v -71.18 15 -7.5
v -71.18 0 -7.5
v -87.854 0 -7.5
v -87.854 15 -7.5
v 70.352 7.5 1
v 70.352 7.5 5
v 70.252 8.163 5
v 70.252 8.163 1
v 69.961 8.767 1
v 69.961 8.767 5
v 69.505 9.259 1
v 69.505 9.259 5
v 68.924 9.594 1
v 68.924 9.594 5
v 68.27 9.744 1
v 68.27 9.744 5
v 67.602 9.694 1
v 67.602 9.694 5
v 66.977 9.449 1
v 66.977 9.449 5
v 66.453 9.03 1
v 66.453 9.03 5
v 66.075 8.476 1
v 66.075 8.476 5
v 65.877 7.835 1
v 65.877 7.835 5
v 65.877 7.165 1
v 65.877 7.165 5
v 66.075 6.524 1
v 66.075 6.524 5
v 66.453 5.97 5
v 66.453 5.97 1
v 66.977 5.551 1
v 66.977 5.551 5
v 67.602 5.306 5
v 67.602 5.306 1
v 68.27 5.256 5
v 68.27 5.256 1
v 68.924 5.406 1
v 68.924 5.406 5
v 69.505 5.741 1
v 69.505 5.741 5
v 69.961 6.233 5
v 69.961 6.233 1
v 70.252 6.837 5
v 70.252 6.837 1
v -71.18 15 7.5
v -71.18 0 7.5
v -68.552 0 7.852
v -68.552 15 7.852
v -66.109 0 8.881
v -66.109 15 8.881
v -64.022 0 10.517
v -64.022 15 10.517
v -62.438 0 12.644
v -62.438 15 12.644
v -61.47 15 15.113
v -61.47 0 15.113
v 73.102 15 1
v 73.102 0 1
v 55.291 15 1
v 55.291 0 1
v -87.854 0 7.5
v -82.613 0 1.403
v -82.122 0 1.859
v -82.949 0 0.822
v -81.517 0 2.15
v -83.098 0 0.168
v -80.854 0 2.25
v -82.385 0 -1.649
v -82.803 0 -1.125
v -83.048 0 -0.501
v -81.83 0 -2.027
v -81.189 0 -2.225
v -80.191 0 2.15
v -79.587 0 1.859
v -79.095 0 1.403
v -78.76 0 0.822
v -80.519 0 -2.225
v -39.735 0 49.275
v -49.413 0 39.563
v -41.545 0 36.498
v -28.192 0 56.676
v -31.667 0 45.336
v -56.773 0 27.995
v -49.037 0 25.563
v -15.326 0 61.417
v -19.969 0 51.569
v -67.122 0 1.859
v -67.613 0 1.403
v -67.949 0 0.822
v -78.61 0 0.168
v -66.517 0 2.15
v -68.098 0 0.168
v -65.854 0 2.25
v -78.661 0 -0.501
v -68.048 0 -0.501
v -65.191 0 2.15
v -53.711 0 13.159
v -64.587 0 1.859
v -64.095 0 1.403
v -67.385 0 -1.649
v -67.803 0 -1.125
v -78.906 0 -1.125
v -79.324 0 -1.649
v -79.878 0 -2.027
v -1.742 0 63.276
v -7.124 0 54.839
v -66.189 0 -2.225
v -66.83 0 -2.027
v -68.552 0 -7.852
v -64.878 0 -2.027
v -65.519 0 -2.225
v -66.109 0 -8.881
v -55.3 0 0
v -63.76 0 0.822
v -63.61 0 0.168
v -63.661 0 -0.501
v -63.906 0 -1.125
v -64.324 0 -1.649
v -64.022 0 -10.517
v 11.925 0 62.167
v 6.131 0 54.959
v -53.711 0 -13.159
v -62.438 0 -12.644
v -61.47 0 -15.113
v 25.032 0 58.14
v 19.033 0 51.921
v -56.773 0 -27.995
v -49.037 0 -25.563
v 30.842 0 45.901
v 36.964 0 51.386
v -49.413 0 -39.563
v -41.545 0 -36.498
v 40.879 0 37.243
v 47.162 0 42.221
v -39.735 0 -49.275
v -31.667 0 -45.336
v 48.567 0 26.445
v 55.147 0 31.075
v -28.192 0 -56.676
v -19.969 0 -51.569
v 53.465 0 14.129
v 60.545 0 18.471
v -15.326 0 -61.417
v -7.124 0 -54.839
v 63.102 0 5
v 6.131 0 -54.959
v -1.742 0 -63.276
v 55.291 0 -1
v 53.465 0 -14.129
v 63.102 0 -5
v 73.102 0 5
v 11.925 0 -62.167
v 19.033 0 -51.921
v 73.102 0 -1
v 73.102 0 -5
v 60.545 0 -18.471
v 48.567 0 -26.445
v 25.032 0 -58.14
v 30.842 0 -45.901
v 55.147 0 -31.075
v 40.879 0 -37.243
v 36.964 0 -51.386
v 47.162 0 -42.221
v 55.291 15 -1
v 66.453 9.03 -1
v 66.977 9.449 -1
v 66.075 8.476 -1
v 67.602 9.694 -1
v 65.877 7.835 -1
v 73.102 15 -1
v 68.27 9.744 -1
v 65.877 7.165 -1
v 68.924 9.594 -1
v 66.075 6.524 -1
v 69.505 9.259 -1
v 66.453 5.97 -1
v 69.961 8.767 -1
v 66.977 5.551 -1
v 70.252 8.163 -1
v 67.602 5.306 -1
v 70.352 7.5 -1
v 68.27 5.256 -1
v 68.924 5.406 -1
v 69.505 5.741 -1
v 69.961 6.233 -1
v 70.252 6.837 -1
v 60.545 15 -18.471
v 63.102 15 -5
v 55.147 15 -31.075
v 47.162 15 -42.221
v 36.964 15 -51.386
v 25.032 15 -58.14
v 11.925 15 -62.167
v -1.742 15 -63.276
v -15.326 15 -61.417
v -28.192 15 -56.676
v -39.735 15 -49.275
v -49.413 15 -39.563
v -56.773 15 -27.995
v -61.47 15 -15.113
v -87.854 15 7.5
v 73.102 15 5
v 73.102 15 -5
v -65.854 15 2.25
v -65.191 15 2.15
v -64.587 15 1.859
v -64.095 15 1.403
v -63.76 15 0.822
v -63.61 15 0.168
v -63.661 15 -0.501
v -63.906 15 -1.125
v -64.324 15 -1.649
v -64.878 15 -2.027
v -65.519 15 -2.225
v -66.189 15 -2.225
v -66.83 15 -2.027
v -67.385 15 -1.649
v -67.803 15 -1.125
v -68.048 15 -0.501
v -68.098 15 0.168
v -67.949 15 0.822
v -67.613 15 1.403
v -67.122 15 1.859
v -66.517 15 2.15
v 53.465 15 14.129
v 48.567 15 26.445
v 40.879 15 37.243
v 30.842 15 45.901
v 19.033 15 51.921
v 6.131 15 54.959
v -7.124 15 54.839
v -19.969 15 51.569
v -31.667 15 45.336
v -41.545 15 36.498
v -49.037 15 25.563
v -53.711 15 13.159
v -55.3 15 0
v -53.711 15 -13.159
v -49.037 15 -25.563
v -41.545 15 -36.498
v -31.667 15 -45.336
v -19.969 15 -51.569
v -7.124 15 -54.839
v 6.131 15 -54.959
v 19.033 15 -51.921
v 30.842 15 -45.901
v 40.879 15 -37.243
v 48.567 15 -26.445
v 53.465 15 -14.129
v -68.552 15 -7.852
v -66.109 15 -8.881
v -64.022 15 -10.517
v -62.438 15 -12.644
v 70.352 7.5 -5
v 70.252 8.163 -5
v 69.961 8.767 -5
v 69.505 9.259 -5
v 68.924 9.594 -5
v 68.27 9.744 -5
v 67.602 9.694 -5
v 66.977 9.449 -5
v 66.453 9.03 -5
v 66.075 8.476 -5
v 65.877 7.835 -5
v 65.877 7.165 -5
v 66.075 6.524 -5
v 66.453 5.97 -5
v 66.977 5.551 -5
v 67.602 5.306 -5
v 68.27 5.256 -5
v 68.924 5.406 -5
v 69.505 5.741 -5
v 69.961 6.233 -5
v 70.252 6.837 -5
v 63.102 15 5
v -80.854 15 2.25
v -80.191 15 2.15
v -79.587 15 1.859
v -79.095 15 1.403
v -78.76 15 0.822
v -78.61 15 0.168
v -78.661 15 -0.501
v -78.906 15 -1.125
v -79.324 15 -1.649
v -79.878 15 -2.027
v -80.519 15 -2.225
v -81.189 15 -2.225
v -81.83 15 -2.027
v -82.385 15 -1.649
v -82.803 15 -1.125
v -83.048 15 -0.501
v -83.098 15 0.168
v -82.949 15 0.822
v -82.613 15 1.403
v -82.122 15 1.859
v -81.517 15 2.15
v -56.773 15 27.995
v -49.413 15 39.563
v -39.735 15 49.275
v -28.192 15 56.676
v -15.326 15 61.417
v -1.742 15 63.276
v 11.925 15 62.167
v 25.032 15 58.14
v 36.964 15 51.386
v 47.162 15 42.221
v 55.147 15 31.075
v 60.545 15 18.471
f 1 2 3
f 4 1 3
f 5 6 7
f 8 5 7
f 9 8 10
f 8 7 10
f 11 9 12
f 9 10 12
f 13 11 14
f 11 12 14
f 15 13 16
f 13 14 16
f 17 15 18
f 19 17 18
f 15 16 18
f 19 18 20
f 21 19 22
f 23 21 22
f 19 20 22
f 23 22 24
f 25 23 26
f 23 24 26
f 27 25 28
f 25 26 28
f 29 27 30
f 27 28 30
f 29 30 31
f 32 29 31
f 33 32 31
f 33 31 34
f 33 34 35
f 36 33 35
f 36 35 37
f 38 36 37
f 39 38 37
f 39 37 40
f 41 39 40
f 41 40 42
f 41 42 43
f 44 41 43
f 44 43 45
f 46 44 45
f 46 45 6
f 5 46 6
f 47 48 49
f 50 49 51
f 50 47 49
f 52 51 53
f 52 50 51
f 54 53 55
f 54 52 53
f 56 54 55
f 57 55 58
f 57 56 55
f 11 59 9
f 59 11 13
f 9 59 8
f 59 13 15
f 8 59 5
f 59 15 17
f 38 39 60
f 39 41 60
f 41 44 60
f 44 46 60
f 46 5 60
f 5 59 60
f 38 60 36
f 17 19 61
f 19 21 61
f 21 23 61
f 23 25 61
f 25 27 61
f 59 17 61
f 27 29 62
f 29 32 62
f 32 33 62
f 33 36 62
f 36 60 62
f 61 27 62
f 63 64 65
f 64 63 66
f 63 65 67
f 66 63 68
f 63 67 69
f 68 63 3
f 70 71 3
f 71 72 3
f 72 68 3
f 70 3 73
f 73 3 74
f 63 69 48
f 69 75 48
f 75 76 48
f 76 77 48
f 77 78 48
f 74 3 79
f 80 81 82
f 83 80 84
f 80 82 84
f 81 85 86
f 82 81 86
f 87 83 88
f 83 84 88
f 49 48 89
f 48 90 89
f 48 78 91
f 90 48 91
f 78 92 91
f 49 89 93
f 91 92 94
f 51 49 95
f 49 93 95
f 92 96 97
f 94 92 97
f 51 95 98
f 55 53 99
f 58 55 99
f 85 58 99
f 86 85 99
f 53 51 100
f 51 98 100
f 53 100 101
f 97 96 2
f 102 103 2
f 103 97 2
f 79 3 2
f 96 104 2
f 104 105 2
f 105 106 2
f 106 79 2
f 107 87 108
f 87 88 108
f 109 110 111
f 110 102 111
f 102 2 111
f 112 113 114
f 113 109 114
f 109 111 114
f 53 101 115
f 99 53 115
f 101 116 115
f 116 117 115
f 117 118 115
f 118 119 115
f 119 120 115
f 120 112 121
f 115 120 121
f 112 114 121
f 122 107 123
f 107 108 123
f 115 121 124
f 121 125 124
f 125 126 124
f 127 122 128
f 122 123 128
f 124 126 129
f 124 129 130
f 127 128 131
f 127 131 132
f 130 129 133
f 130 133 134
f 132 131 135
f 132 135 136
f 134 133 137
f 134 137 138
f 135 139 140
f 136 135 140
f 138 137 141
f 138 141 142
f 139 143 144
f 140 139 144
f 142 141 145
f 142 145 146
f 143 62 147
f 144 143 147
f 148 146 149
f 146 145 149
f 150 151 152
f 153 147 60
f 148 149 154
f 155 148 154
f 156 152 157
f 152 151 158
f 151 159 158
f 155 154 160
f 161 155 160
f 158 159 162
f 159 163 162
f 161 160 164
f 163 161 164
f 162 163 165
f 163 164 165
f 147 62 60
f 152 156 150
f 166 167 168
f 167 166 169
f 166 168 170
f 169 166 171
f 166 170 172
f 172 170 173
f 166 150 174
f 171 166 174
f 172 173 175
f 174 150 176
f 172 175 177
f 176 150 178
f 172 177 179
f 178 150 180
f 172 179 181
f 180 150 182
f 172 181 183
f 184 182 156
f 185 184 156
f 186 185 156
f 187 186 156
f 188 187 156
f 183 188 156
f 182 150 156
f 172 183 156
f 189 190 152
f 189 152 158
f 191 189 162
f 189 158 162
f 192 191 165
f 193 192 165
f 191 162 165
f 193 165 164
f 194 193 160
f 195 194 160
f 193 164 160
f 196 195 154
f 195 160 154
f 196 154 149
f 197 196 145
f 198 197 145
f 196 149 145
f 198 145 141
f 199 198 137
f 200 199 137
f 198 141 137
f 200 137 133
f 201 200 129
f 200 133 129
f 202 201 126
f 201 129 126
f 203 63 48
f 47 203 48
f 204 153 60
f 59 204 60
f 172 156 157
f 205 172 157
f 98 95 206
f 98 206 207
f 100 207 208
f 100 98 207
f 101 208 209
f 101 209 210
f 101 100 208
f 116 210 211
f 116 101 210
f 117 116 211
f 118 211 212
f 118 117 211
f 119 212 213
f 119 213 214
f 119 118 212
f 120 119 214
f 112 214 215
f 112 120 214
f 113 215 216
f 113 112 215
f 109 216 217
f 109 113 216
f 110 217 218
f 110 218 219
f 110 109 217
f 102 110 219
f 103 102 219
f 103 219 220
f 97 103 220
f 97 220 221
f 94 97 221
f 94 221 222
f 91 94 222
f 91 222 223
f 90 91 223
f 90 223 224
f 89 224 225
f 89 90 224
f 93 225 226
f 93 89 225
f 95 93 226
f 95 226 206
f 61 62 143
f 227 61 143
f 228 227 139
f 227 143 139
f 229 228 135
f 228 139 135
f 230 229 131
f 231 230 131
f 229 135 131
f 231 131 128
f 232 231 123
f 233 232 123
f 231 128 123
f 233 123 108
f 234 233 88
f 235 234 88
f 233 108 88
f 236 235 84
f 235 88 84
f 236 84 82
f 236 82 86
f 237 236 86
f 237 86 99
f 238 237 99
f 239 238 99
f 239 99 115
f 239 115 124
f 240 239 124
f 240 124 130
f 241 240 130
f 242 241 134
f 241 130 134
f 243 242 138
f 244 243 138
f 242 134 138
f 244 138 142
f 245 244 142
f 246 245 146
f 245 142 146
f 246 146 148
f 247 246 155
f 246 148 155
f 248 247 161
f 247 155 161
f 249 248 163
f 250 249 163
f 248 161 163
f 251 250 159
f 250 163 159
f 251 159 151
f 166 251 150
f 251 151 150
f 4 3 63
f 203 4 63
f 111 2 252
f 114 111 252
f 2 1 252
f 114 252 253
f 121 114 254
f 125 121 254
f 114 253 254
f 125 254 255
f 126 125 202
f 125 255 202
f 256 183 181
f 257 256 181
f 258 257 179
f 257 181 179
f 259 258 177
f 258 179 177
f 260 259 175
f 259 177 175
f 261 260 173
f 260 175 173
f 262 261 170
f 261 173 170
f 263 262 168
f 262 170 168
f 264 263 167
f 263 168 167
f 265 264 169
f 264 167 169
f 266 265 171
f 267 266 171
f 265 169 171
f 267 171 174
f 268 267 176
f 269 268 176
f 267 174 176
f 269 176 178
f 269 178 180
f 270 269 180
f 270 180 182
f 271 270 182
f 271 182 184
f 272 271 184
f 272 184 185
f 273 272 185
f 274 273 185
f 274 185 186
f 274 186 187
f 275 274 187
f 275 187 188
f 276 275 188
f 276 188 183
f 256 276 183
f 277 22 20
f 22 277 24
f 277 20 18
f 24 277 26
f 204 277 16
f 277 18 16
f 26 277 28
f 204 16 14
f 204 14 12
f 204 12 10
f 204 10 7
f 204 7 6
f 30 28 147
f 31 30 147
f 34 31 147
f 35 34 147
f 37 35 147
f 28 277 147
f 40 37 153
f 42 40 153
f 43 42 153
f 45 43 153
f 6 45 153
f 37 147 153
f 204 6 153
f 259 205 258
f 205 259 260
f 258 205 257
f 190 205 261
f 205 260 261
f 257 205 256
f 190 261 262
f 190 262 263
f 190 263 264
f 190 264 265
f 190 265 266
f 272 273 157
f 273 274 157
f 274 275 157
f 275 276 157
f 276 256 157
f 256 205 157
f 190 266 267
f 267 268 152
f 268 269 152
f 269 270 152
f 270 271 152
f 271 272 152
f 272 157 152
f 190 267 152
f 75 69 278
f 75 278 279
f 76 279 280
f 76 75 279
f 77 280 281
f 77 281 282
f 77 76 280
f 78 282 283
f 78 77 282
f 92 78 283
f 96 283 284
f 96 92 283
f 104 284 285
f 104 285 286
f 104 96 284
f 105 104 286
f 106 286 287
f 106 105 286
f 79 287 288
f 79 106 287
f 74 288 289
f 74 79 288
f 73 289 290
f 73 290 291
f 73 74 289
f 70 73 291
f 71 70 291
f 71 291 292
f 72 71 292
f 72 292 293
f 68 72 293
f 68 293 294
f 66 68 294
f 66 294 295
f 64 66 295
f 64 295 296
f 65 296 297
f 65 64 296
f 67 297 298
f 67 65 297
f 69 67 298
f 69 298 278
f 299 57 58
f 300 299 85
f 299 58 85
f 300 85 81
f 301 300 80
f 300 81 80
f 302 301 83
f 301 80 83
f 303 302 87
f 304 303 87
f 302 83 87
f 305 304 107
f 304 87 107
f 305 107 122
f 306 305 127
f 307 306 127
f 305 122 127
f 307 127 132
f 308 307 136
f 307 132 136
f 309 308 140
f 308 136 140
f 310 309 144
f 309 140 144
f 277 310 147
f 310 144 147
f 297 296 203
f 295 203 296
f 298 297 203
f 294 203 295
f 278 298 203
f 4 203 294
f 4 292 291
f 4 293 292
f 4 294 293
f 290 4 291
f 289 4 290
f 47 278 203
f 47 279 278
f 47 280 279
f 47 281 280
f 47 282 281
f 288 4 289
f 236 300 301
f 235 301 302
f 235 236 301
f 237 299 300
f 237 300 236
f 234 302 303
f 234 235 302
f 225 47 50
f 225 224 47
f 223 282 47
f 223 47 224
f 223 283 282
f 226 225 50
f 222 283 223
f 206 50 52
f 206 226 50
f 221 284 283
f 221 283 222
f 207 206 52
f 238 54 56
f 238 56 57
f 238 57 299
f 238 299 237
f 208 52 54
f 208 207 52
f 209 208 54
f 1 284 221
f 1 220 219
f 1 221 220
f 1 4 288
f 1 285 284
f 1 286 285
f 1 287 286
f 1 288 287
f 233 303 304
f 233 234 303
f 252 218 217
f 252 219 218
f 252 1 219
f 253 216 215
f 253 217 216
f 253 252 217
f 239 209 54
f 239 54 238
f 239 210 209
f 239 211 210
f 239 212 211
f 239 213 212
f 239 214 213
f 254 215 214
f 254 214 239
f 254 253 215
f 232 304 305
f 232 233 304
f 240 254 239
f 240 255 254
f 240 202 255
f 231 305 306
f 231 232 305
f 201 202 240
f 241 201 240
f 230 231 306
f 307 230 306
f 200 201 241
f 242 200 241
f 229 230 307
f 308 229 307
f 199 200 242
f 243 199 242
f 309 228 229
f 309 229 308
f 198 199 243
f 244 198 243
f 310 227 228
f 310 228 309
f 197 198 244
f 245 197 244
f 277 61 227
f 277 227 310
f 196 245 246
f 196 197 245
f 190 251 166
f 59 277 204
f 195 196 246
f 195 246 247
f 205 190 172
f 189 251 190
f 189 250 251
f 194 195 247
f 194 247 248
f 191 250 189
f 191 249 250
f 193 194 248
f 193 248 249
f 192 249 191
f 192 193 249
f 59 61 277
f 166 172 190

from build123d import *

# Parameters (mm, degrees)
SKETCH1_R           = 2.25
BOSS_EXTRUDE1_DEPTH = 15
SKETCH2_R           = 2.25
CUT_EXTRUDE1_DEPTH  = 20
FILLET1_R           = 10


with BuildPart() as part:
    # Sketch1 → Boss-Extrude1 (new body)
    with BuildSketch(Plane(origin=(0, 0, 0), x_dir=(1, 0, 0), z_dir=(0, 1, 0))):
        with BuildLine():
            Line((-87.85411681, -7.5), (-62.85411681, -7.5))
            ThreePointArc((-62.85411681, -7.5), (1.256140371, -63.287535197), (63.102218661, -5))
            Line((63.102218661, -5), (73.102218661, -5))
            Line((73.102218661, -5), (73.102218661, -1))
            Line((73.102218661, -1), (55.290957669, -1))
            ThreePointArc((55.290957669, -1), (-55.3, 0), (55.290957669, 1))
            Line((55.290957669, 1), (73.102218661, 1))
            Line((73.102218661, 1), (73.102218661, 5))
            Line((73.102218661, 5), (63.102218661, 5))
            ThreePointArc((63.102218661, 5), (1.256140371, 63.287535197), (-62.85411681, 7.5))
            Line((-62.85411681, 7.5), (-87.85411681, 7.5))
            Line((-87.85411681, 7.5), (-87.85411681, -7.5))
        make_face()
        with Locations(Location((-80.85411681, 0, 0), (0, 0, 270))):
            Circle(SKETCH1_R, mode=Mode.SUBTRACT)
        with Locations(Location((-65.85411681, 0, 0), (0, 0, 270))):
            Circle(SKETCH1_R, mode=Mode.SUBTRACT)
    extrude(amount=BOSS_EXTRUDE1_DEPTH)

    # Sketch2 → Cut-Extrude1 (cut)
    with BuildSketch(Plane.XY.offset(5)):
        with Locations((68.102218661, 7.5)):
            Circle(SKETCH2_R)
    extrude(amount=-CUT_EXTRUDE1_DEPTH, mode=Mode.SUBTRACT)

    # Fillet1
    fillet1_edges = [part.edges().sort_by_distance(p)[0] for p in [
        (-62.85411681, 7.5, 7.5),
        (-62.85411681, 7.5, -7.5),
    ]]
    fillet(fillet1_edges, radius=FILLET1_R)


solid = part.part
